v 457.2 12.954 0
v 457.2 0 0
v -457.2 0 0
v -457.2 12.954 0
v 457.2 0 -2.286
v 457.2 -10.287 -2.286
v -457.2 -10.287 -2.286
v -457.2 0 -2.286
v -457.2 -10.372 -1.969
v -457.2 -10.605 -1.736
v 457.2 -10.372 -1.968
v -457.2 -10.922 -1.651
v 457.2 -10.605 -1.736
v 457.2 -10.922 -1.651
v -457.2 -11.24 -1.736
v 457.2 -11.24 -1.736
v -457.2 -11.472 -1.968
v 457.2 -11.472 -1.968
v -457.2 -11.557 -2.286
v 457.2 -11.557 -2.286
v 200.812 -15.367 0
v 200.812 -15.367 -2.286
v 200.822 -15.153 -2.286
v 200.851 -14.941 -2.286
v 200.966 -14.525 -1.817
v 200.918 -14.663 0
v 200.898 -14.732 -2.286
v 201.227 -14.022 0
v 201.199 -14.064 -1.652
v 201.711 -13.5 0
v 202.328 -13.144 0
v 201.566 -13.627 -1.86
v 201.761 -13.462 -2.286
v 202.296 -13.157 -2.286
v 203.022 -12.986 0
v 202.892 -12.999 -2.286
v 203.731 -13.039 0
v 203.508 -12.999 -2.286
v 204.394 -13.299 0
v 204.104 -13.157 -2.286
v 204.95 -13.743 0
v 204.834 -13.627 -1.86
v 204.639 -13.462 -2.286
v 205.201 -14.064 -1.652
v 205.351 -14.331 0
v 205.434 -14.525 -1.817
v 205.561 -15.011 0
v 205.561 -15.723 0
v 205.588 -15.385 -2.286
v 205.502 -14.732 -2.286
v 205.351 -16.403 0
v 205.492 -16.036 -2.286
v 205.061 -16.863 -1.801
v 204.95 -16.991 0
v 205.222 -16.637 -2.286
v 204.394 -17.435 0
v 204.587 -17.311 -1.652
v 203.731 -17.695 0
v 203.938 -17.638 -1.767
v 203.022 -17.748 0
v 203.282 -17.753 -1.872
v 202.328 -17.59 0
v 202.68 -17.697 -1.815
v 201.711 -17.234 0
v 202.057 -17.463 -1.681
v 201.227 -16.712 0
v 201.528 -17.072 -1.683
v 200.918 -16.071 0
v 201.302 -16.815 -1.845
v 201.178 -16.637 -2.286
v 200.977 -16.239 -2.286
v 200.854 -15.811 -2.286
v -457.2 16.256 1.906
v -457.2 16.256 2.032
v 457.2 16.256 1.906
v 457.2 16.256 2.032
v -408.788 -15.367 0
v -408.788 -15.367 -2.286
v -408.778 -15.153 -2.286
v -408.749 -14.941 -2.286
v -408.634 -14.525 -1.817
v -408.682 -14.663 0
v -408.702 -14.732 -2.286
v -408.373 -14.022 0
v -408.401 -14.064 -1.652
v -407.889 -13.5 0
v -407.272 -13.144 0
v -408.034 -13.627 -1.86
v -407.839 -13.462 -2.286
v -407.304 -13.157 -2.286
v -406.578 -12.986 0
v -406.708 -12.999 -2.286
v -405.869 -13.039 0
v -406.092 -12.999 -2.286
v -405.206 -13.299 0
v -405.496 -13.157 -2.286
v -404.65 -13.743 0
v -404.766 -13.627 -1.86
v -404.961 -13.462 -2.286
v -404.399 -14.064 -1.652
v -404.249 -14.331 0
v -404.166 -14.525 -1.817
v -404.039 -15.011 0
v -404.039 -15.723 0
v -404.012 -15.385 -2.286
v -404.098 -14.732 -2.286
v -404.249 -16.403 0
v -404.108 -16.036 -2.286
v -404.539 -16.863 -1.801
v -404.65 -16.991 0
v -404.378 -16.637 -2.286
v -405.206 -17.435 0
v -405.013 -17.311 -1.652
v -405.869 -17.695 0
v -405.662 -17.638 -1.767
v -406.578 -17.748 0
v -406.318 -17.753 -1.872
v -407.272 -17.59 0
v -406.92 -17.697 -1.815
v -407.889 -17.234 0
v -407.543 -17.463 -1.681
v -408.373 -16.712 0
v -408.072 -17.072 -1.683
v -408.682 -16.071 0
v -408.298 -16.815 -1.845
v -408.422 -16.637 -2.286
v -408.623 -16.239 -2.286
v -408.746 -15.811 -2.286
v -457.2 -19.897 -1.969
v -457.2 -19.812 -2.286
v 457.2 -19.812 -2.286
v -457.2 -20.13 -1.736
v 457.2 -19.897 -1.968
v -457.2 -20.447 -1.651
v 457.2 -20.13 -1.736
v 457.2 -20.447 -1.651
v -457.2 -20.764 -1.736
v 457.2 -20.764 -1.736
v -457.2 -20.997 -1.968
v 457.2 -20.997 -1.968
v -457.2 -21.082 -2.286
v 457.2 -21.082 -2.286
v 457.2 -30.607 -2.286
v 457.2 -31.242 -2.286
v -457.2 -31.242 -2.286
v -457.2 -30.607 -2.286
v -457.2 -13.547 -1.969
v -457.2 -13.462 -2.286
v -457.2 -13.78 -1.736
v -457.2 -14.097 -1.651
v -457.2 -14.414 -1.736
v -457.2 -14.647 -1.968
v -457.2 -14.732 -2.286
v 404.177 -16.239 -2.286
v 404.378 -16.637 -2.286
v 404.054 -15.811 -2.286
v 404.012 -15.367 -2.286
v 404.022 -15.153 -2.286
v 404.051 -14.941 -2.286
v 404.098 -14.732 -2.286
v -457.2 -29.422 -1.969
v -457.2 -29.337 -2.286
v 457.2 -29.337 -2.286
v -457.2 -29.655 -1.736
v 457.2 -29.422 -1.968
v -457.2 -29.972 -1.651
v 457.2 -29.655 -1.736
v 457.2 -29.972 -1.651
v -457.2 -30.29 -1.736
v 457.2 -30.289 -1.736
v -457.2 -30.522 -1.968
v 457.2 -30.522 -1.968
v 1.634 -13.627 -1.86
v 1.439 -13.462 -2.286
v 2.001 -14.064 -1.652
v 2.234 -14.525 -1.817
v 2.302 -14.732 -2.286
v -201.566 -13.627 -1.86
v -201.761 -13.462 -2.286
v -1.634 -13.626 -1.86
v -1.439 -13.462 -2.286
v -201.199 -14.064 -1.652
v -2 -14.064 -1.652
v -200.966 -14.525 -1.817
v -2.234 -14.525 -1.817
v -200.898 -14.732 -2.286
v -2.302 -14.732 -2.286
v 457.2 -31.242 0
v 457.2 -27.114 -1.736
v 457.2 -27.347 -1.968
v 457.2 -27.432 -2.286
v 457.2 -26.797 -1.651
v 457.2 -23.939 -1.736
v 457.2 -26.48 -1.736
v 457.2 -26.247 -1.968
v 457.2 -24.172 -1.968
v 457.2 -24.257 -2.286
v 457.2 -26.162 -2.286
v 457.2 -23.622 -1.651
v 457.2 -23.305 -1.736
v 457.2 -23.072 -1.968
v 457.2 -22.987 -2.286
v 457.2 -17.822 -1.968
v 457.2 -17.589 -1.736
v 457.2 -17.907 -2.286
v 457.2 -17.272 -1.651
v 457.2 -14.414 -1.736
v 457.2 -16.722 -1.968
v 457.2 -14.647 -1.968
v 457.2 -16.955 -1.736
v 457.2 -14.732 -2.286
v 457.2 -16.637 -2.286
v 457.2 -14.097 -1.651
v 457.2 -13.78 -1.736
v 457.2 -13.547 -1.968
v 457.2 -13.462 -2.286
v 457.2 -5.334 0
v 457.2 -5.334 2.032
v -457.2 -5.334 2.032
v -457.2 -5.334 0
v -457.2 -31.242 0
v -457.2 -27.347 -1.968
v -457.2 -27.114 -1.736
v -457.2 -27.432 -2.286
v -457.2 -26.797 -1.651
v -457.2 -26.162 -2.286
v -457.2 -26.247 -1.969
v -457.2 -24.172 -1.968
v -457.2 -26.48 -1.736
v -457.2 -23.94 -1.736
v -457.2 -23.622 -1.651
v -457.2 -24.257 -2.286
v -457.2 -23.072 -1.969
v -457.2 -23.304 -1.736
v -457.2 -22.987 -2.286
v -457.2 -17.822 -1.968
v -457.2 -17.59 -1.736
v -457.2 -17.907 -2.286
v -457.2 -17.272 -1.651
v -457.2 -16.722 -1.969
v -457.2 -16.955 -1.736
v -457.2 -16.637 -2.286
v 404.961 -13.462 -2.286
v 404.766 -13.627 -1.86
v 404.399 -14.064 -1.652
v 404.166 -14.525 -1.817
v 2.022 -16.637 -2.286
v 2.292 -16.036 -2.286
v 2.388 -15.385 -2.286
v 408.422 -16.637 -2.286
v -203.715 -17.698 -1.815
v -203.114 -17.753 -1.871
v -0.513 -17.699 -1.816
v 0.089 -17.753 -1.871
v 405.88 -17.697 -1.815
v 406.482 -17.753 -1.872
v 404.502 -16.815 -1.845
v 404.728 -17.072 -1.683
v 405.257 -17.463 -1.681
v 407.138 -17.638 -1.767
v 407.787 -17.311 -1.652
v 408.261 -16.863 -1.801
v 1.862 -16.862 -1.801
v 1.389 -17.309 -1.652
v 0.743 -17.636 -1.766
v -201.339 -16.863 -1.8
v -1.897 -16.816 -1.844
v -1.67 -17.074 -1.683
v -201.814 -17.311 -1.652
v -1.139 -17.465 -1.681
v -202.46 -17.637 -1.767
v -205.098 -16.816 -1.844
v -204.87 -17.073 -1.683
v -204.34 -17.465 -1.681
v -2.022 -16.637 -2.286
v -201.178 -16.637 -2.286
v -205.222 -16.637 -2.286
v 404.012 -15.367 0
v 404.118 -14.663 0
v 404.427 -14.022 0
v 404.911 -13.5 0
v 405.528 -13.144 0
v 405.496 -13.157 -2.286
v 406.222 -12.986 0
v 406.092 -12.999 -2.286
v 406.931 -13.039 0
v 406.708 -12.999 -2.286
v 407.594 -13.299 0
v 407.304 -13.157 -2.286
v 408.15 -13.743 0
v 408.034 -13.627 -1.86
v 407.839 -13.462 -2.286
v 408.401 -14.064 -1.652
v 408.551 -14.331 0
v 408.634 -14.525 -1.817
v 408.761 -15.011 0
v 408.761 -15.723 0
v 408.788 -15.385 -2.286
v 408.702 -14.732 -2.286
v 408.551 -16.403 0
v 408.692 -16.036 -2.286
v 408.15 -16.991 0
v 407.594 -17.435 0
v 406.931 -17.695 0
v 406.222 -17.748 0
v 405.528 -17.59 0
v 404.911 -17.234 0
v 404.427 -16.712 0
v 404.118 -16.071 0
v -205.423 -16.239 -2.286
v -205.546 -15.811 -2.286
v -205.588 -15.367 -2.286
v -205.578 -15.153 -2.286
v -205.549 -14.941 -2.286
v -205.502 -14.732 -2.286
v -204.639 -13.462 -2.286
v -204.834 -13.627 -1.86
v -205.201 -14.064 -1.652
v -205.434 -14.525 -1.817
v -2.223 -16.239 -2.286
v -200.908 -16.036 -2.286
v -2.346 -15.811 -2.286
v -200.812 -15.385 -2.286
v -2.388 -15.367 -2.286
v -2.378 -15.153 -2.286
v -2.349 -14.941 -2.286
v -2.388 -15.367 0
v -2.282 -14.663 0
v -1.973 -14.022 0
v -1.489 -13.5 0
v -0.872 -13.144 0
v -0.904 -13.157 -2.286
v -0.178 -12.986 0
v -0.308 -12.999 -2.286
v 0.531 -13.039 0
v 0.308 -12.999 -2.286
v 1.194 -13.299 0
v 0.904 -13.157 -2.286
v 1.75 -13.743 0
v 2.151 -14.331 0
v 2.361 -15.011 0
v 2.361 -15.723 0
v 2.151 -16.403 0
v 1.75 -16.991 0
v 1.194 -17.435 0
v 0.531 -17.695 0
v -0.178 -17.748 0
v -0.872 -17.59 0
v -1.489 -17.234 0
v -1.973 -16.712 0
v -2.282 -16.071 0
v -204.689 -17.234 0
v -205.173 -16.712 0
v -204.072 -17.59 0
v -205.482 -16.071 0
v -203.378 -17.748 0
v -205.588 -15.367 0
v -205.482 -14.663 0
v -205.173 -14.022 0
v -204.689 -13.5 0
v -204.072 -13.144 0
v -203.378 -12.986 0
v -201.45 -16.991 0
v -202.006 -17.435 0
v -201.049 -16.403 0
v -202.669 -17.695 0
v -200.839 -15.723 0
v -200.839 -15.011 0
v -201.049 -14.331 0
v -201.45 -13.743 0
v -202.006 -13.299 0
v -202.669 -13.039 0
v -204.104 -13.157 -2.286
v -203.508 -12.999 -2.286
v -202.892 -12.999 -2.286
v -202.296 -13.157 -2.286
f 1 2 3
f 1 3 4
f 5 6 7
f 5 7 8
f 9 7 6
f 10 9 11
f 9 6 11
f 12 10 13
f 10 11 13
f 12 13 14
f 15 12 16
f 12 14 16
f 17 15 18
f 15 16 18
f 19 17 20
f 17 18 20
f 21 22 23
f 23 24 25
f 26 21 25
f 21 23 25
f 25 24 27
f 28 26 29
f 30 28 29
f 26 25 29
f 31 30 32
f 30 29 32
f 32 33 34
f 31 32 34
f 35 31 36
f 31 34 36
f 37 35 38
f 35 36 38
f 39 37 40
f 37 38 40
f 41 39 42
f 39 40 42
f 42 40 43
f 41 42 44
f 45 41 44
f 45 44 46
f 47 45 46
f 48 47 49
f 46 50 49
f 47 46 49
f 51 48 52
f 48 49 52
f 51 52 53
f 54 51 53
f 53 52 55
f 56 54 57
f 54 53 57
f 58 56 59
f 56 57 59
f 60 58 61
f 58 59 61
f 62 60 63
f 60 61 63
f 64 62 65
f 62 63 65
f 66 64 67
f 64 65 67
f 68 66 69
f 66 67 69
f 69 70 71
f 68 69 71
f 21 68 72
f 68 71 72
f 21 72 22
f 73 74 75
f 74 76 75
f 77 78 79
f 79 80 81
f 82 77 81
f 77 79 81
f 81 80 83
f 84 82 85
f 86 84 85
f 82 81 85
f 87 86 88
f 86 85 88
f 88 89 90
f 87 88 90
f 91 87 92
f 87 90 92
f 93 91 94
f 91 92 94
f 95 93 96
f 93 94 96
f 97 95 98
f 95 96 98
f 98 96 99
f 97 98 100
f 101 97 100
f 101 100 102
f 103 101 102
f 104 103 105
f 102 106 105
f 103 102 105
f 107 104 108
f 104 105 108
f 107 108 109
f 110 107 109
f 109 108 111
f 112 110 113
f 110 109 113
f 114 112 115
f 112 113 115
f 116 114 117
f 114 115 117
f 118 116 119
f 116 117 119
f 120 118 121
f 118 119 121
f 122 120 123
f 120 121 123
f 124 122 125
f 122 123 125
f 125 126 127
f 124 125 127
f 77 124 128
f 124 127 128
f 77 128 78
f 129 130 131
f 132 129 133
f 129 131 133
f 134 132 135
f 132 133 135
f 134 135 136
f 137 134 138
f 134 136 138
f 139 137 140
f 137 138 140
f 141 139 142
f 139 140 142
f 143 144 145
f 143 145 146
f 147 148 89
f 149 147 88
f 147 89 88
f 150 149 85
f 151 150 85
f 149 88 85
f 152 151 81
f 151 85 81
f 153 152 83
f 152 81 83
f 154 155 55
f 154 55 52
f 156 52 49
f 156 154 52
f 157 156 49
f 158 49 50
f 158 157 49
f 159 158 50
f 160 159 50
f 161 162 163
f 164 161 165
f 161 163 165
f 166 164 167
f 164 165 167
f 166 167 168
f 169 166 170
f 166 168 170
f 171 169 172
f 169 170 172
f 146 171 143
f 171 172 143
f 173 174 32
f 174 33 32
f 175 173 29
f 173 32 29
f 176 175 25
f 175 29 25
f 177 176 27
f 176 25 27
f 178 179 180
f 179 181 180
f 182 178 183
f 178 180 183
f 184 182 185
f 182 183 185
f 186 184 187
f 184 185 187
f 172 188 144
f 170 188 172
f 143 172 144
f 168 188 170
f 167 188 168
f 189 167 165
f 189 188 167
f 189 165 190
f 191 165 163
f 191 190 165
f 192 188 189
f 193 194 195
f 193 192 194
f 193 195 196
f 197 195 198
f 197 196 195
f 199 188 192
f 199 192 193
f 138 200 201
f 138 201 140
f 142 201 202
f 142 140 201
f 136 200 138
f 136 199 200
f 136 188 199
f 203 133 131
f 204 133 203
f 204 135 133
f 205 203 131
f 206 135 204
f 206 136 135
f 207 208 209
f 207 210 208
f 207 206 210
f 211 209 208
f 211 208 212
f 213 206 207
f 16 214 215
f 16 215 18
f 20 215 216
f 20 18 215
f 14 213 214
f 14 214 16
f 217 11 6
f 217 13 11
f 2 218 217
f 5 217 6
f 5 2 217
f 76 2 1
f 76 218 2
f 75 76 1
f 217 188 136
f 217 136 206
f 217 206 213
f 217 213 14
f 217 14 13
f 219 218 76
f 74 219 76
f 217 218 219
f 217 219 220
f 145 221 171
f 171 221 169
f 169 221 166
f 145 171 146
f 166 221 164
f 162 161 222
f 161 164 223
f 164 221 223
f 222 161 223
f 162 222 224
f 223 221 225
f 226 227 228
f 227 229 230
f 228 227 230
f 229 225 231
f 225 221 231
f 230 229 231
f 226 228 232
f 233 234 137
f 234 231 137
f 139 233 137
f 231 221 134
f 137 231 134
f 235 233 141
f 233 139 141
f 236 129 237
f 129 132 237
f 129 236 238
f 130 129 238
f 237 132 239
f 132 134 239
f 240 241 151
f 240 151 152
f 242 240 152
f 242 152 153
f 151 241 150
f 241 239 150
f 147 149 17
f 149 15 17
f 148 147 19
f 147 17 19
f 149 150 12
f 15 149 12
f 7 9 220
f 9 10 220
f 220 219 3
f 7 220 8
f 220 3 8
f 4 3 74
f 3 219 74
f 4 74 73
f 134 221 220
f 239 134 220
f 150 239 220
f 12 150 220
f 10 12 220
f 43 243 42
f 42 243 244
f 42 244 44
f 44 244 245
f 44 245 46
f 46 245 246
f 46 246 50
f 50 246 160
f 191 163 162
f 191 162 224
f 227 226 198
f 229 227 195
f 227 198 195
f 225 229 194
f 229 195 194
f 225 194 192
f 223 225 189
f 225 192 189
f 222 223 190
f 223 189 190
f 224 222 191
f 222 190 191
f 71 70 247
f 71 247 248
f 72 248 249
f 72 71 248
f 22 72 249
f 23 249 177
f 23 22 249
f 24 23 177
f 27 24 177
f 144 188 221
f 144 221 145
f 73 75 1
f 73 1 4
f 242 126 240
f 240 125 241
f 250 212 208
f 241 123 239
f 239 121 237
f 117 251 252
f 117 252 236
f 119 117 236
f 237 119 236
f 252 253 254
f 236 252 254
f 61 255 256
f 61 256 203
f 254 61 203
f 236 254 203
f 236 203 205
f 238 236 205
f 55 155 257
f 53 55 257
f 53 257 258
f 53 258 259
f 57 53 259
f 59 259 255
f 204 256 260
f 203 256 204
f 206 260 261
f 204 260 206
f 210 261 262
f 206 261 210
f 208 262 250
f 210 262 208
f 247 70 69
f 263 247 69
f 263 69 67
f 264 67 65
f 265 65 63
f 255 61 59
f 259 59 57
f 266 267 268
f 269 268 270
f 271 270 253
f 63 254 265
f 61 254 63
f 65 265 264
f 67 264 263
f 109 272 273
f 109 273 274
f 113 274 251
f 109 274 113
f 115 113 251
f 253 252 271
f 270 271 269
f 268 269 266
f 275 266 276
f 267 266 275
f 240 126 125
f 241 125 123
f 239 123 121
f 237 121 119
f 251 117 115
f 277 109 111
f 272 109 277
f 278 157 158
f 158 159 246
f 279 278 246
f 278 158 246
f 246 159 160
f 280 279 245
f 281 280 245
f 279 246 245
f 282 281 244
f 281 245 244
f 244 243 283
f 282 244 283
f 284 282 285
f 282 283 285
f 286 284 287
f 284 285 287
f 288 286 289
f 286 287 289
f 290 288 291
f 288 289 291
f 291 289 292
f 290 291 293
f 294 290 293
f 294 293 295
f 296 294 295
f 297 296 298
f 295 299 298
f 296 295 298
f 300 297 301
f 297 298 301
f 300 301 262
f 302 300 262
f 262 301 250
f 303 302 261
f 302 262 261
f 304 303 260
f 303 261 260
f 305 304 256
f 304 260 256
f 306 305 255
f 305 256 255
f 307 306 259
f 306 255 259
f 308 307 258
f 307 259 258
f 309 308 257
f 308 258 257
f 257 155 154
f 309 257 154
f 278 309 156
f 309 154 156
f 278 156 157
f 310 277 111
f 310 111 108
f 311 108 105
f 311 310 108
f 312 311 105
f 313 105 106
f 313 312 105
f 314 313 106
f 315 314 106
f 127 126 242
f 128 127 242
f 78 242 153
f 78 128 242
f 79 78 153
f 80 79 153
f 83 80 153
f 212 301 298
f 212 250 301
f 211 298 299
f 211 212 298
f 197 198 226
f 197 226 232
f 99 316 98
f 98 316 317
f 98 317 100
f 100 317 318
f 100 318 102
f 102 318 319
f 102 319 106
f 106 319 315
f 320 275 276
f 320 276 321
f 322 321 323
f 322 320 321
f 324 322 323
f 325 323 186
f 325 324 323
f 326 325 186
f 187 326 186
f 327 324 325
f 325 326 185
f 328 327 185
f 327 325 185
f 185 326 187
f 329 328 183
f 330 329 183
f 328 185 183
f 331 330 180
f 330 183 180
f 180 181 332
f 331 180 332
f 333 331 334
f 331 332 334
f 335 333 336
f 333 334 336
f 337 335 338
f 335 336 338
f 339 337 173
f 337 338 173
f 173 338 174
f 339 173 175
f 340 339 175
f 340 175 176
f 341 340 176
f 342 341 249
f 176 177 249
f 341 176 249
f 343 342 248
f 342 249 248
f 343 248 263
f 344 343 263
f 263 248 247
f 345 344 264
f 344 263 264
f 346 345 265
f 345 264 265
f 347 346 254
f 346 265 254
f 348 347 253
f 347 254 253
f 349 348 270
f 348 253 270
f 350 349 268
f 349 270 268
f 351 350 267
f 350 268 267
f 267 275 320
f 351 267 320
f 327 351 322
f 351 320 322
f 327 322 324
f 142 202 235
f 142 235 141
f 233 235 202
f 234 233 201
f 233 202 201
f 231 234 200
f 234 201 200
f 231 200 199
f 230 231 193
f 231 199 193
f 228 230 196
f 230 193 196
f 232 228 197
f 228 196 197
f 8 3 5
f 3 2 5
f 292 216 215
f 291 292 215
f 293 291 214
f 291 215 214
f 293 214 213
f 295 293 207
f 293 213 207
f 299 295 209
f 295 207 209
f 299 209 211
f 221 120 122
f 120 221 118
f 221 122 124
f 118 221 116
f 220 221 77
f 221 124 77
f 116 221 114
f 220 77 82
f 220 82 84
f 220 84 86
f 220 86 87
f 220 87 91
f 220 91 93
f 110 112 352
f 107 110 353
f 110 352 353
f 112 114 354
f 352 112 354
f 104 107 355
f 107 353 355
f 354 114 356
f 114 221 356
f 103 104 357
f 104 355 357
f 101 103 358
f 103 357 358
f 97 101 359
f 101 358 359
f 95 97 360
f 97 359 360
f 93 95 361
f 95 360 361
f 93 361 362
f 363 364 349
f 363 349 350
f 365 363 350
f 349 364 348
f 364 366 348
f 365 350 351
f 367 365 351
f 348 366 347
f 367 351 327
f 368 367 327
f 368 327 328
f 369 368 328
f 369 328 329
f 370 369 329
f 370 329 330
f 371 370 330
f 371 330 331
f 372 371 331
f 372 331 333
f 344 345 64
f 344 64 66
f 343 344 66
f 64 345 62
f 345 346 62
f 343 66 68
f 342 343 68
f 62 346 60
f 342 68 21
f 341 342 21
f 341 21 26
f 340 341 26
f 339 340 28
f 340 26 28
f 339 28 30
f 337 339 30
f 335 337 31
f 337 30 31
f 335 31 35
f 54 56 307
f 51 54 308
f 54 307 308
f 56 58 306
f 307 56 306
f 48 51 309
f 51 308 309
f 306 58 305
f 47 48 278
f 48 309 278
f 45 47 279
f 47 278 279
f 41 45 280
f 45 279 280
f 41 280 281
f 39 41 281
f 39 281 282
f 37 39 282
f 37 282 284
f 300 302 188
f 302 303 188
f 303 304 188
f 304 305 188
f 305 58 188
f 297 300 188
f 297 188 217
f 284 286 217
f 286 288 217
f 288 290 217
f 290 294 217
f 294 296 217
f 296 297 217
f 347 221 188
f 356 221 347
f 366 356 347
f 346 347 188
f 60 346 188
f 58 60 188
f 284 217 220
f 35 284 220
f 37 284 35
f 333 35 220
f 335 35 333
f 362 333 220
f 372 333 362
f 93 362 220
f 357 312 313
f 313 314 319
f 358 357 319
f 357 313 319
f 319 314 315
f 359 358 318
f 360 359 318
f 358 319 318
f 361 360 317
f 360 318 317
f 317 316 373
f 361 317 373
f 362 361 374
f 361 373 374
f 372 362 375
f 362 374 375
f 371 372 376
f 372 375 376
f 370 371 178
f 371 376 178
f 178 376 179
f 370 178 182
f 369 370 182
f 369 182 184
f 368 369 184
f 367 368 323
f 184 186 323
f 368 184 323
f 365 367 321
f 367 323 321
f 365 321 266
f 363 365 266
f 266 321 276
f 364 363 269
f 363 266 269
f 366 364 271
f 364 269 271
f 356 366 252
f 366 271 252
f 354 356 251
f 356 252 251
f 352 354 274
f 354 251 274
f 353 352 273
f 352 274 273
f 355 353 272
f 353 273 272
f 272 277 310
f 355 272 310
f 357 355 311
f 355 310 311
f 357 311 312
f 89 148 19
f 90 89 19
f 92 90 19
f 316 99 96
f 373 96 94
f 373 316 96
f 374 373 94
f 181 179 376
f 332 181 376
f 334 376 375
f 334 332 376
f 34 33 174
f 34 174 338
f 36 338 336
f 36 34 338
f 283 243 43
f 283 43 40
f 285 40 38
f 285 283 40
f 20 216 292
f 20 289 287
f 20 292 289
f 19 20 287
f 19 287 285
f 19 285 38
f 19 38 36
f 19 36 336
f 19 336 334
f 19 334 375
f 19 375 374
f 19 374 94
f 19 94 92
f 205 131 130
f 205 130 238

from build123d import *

# Parameters (mm, degrees)
SKETCH1_W            = 2.032
SKETCH1_H            = 21.59
EXTRUDE_THIN1_DEPTH  = 457.2
SKETCH2_W            = 2.286
SKETCH2_H            = 31.242
EXTRUDE_THIN2_DEPTH  = 457.2
CHAMFER1_SIZE        = 3.302
CHAMFER1_SIZE2       = 1.906410589
SKETCH3_R            = 2.3876
CUT_EXTRUDE1_DEPTH   = 2.286
LPATTERN2_COUNT      = 5
LPATTERN2_PITCH      = 203.2
LPATTERN2_COUNT_DIR2 = 5
LPATTERN2_PITCH_DIR2 = 203.2
SKETCH4_R            = 0.635
CUT_EXTRUDE2_DEPTH   = 915.93641766
LPATTERN1_COUNT      = 7
LPATTERN1_PITCH      = 3.175


with BuildPart() as part:
    # Sketch1 → Extrude-Thin1 (new, symmetric)
    with BuildSketch(Plane(origin=(0, 0, 0), x_dir=(0, 0, -1), z_dir=(1, 0, 0))):
        with Locations((-1.016, 5.461)):
            Rectangle(SKETCH1_W, SKETCH1_H)
    extrude(amount=EXTRUDE_THIN1_DEPTH, both=True)

    # Sketch2 → Extrude-Thin2 (add, symmetric)
    with BuildSketch(Plane(origin=(0, 0, 0), x_dir=(0, 0, -1), z_dir=(1, 0, 0))):
        with Locations((1.143, -15.621)):
            Rectangle(SKETCH2_W, SKETCH2_H)
    extrude(amount=EXTRUDE_THIN2_DEPTH, both=True)

    # Chamfer1
    chamfer1_edges = [part.edges().sort_by_distance(p)[0] for p in [
        (0, 16.256, 0),
    ]]
    chamfer1_side = [part.faces().sort_by_distance(p)[0] for p in [
        (0, 8.128, 0),
    ]]
    chamfer(chamfer1_edges, length=CHAMFER1_SIZE, length2=CHAMFER1_SIZE2, reference=chamfer1_side[0])

    # Sketch3 → Cut-Extrude1 (cut)
    with BuildSketch(Plane(origin=(0, 0, -2.286), x_dir=(-1, 0, 0), z_dir=(0, 0, -1))):
        with Locations((0, -15.367)):
            Circle(SKETCH3_R)
    cut_extrude1 = extrude(amount=-CUT_EXTRUDE1_DEPTH, mode=Mode.SUBTRACT)

    # LPattern2: Cut-Extrude1 5 × 5
    with Locations(*[Vector(-1, 0, 0) * (i * LPATTERN2_PITCH) + Vector(1, 0, 0) * (j * LPATTERN2_PITCH_DIR2) for i in range(LPATTERN2_COUNT) for j in range(LPATTERN2_COUNT_DIR2) if (i, j) != (0, 0)]):
        add(cut_extrude1, mode=Mode.SUBTRACT)

    # Sketch4 → Cut-Extrude2 (cut, through all)
    with BuildSketch(Plane(origin=(457.2, 0, 0), x_dir=(0, 0, -1), z_dir=(1, 0, 0))):
        with Locations((2.286, -29.972)):
            Circle(SKETCH4_R)
    cut_extrude2 = extrude(amount=-CUT_EXTRUDE2_DEPTH, mode=Mode.SUBTRACT)

    # LPattern1: Cut-Extrude2 ×7
    with Locations(*[(0, i * LPATTERN1_PITCH, 0) for i in range(1, LPATTERN1_COUNT)]):
        add(cut_extrude2, mode=Mode.SUBTRACT)


solid = part.part
